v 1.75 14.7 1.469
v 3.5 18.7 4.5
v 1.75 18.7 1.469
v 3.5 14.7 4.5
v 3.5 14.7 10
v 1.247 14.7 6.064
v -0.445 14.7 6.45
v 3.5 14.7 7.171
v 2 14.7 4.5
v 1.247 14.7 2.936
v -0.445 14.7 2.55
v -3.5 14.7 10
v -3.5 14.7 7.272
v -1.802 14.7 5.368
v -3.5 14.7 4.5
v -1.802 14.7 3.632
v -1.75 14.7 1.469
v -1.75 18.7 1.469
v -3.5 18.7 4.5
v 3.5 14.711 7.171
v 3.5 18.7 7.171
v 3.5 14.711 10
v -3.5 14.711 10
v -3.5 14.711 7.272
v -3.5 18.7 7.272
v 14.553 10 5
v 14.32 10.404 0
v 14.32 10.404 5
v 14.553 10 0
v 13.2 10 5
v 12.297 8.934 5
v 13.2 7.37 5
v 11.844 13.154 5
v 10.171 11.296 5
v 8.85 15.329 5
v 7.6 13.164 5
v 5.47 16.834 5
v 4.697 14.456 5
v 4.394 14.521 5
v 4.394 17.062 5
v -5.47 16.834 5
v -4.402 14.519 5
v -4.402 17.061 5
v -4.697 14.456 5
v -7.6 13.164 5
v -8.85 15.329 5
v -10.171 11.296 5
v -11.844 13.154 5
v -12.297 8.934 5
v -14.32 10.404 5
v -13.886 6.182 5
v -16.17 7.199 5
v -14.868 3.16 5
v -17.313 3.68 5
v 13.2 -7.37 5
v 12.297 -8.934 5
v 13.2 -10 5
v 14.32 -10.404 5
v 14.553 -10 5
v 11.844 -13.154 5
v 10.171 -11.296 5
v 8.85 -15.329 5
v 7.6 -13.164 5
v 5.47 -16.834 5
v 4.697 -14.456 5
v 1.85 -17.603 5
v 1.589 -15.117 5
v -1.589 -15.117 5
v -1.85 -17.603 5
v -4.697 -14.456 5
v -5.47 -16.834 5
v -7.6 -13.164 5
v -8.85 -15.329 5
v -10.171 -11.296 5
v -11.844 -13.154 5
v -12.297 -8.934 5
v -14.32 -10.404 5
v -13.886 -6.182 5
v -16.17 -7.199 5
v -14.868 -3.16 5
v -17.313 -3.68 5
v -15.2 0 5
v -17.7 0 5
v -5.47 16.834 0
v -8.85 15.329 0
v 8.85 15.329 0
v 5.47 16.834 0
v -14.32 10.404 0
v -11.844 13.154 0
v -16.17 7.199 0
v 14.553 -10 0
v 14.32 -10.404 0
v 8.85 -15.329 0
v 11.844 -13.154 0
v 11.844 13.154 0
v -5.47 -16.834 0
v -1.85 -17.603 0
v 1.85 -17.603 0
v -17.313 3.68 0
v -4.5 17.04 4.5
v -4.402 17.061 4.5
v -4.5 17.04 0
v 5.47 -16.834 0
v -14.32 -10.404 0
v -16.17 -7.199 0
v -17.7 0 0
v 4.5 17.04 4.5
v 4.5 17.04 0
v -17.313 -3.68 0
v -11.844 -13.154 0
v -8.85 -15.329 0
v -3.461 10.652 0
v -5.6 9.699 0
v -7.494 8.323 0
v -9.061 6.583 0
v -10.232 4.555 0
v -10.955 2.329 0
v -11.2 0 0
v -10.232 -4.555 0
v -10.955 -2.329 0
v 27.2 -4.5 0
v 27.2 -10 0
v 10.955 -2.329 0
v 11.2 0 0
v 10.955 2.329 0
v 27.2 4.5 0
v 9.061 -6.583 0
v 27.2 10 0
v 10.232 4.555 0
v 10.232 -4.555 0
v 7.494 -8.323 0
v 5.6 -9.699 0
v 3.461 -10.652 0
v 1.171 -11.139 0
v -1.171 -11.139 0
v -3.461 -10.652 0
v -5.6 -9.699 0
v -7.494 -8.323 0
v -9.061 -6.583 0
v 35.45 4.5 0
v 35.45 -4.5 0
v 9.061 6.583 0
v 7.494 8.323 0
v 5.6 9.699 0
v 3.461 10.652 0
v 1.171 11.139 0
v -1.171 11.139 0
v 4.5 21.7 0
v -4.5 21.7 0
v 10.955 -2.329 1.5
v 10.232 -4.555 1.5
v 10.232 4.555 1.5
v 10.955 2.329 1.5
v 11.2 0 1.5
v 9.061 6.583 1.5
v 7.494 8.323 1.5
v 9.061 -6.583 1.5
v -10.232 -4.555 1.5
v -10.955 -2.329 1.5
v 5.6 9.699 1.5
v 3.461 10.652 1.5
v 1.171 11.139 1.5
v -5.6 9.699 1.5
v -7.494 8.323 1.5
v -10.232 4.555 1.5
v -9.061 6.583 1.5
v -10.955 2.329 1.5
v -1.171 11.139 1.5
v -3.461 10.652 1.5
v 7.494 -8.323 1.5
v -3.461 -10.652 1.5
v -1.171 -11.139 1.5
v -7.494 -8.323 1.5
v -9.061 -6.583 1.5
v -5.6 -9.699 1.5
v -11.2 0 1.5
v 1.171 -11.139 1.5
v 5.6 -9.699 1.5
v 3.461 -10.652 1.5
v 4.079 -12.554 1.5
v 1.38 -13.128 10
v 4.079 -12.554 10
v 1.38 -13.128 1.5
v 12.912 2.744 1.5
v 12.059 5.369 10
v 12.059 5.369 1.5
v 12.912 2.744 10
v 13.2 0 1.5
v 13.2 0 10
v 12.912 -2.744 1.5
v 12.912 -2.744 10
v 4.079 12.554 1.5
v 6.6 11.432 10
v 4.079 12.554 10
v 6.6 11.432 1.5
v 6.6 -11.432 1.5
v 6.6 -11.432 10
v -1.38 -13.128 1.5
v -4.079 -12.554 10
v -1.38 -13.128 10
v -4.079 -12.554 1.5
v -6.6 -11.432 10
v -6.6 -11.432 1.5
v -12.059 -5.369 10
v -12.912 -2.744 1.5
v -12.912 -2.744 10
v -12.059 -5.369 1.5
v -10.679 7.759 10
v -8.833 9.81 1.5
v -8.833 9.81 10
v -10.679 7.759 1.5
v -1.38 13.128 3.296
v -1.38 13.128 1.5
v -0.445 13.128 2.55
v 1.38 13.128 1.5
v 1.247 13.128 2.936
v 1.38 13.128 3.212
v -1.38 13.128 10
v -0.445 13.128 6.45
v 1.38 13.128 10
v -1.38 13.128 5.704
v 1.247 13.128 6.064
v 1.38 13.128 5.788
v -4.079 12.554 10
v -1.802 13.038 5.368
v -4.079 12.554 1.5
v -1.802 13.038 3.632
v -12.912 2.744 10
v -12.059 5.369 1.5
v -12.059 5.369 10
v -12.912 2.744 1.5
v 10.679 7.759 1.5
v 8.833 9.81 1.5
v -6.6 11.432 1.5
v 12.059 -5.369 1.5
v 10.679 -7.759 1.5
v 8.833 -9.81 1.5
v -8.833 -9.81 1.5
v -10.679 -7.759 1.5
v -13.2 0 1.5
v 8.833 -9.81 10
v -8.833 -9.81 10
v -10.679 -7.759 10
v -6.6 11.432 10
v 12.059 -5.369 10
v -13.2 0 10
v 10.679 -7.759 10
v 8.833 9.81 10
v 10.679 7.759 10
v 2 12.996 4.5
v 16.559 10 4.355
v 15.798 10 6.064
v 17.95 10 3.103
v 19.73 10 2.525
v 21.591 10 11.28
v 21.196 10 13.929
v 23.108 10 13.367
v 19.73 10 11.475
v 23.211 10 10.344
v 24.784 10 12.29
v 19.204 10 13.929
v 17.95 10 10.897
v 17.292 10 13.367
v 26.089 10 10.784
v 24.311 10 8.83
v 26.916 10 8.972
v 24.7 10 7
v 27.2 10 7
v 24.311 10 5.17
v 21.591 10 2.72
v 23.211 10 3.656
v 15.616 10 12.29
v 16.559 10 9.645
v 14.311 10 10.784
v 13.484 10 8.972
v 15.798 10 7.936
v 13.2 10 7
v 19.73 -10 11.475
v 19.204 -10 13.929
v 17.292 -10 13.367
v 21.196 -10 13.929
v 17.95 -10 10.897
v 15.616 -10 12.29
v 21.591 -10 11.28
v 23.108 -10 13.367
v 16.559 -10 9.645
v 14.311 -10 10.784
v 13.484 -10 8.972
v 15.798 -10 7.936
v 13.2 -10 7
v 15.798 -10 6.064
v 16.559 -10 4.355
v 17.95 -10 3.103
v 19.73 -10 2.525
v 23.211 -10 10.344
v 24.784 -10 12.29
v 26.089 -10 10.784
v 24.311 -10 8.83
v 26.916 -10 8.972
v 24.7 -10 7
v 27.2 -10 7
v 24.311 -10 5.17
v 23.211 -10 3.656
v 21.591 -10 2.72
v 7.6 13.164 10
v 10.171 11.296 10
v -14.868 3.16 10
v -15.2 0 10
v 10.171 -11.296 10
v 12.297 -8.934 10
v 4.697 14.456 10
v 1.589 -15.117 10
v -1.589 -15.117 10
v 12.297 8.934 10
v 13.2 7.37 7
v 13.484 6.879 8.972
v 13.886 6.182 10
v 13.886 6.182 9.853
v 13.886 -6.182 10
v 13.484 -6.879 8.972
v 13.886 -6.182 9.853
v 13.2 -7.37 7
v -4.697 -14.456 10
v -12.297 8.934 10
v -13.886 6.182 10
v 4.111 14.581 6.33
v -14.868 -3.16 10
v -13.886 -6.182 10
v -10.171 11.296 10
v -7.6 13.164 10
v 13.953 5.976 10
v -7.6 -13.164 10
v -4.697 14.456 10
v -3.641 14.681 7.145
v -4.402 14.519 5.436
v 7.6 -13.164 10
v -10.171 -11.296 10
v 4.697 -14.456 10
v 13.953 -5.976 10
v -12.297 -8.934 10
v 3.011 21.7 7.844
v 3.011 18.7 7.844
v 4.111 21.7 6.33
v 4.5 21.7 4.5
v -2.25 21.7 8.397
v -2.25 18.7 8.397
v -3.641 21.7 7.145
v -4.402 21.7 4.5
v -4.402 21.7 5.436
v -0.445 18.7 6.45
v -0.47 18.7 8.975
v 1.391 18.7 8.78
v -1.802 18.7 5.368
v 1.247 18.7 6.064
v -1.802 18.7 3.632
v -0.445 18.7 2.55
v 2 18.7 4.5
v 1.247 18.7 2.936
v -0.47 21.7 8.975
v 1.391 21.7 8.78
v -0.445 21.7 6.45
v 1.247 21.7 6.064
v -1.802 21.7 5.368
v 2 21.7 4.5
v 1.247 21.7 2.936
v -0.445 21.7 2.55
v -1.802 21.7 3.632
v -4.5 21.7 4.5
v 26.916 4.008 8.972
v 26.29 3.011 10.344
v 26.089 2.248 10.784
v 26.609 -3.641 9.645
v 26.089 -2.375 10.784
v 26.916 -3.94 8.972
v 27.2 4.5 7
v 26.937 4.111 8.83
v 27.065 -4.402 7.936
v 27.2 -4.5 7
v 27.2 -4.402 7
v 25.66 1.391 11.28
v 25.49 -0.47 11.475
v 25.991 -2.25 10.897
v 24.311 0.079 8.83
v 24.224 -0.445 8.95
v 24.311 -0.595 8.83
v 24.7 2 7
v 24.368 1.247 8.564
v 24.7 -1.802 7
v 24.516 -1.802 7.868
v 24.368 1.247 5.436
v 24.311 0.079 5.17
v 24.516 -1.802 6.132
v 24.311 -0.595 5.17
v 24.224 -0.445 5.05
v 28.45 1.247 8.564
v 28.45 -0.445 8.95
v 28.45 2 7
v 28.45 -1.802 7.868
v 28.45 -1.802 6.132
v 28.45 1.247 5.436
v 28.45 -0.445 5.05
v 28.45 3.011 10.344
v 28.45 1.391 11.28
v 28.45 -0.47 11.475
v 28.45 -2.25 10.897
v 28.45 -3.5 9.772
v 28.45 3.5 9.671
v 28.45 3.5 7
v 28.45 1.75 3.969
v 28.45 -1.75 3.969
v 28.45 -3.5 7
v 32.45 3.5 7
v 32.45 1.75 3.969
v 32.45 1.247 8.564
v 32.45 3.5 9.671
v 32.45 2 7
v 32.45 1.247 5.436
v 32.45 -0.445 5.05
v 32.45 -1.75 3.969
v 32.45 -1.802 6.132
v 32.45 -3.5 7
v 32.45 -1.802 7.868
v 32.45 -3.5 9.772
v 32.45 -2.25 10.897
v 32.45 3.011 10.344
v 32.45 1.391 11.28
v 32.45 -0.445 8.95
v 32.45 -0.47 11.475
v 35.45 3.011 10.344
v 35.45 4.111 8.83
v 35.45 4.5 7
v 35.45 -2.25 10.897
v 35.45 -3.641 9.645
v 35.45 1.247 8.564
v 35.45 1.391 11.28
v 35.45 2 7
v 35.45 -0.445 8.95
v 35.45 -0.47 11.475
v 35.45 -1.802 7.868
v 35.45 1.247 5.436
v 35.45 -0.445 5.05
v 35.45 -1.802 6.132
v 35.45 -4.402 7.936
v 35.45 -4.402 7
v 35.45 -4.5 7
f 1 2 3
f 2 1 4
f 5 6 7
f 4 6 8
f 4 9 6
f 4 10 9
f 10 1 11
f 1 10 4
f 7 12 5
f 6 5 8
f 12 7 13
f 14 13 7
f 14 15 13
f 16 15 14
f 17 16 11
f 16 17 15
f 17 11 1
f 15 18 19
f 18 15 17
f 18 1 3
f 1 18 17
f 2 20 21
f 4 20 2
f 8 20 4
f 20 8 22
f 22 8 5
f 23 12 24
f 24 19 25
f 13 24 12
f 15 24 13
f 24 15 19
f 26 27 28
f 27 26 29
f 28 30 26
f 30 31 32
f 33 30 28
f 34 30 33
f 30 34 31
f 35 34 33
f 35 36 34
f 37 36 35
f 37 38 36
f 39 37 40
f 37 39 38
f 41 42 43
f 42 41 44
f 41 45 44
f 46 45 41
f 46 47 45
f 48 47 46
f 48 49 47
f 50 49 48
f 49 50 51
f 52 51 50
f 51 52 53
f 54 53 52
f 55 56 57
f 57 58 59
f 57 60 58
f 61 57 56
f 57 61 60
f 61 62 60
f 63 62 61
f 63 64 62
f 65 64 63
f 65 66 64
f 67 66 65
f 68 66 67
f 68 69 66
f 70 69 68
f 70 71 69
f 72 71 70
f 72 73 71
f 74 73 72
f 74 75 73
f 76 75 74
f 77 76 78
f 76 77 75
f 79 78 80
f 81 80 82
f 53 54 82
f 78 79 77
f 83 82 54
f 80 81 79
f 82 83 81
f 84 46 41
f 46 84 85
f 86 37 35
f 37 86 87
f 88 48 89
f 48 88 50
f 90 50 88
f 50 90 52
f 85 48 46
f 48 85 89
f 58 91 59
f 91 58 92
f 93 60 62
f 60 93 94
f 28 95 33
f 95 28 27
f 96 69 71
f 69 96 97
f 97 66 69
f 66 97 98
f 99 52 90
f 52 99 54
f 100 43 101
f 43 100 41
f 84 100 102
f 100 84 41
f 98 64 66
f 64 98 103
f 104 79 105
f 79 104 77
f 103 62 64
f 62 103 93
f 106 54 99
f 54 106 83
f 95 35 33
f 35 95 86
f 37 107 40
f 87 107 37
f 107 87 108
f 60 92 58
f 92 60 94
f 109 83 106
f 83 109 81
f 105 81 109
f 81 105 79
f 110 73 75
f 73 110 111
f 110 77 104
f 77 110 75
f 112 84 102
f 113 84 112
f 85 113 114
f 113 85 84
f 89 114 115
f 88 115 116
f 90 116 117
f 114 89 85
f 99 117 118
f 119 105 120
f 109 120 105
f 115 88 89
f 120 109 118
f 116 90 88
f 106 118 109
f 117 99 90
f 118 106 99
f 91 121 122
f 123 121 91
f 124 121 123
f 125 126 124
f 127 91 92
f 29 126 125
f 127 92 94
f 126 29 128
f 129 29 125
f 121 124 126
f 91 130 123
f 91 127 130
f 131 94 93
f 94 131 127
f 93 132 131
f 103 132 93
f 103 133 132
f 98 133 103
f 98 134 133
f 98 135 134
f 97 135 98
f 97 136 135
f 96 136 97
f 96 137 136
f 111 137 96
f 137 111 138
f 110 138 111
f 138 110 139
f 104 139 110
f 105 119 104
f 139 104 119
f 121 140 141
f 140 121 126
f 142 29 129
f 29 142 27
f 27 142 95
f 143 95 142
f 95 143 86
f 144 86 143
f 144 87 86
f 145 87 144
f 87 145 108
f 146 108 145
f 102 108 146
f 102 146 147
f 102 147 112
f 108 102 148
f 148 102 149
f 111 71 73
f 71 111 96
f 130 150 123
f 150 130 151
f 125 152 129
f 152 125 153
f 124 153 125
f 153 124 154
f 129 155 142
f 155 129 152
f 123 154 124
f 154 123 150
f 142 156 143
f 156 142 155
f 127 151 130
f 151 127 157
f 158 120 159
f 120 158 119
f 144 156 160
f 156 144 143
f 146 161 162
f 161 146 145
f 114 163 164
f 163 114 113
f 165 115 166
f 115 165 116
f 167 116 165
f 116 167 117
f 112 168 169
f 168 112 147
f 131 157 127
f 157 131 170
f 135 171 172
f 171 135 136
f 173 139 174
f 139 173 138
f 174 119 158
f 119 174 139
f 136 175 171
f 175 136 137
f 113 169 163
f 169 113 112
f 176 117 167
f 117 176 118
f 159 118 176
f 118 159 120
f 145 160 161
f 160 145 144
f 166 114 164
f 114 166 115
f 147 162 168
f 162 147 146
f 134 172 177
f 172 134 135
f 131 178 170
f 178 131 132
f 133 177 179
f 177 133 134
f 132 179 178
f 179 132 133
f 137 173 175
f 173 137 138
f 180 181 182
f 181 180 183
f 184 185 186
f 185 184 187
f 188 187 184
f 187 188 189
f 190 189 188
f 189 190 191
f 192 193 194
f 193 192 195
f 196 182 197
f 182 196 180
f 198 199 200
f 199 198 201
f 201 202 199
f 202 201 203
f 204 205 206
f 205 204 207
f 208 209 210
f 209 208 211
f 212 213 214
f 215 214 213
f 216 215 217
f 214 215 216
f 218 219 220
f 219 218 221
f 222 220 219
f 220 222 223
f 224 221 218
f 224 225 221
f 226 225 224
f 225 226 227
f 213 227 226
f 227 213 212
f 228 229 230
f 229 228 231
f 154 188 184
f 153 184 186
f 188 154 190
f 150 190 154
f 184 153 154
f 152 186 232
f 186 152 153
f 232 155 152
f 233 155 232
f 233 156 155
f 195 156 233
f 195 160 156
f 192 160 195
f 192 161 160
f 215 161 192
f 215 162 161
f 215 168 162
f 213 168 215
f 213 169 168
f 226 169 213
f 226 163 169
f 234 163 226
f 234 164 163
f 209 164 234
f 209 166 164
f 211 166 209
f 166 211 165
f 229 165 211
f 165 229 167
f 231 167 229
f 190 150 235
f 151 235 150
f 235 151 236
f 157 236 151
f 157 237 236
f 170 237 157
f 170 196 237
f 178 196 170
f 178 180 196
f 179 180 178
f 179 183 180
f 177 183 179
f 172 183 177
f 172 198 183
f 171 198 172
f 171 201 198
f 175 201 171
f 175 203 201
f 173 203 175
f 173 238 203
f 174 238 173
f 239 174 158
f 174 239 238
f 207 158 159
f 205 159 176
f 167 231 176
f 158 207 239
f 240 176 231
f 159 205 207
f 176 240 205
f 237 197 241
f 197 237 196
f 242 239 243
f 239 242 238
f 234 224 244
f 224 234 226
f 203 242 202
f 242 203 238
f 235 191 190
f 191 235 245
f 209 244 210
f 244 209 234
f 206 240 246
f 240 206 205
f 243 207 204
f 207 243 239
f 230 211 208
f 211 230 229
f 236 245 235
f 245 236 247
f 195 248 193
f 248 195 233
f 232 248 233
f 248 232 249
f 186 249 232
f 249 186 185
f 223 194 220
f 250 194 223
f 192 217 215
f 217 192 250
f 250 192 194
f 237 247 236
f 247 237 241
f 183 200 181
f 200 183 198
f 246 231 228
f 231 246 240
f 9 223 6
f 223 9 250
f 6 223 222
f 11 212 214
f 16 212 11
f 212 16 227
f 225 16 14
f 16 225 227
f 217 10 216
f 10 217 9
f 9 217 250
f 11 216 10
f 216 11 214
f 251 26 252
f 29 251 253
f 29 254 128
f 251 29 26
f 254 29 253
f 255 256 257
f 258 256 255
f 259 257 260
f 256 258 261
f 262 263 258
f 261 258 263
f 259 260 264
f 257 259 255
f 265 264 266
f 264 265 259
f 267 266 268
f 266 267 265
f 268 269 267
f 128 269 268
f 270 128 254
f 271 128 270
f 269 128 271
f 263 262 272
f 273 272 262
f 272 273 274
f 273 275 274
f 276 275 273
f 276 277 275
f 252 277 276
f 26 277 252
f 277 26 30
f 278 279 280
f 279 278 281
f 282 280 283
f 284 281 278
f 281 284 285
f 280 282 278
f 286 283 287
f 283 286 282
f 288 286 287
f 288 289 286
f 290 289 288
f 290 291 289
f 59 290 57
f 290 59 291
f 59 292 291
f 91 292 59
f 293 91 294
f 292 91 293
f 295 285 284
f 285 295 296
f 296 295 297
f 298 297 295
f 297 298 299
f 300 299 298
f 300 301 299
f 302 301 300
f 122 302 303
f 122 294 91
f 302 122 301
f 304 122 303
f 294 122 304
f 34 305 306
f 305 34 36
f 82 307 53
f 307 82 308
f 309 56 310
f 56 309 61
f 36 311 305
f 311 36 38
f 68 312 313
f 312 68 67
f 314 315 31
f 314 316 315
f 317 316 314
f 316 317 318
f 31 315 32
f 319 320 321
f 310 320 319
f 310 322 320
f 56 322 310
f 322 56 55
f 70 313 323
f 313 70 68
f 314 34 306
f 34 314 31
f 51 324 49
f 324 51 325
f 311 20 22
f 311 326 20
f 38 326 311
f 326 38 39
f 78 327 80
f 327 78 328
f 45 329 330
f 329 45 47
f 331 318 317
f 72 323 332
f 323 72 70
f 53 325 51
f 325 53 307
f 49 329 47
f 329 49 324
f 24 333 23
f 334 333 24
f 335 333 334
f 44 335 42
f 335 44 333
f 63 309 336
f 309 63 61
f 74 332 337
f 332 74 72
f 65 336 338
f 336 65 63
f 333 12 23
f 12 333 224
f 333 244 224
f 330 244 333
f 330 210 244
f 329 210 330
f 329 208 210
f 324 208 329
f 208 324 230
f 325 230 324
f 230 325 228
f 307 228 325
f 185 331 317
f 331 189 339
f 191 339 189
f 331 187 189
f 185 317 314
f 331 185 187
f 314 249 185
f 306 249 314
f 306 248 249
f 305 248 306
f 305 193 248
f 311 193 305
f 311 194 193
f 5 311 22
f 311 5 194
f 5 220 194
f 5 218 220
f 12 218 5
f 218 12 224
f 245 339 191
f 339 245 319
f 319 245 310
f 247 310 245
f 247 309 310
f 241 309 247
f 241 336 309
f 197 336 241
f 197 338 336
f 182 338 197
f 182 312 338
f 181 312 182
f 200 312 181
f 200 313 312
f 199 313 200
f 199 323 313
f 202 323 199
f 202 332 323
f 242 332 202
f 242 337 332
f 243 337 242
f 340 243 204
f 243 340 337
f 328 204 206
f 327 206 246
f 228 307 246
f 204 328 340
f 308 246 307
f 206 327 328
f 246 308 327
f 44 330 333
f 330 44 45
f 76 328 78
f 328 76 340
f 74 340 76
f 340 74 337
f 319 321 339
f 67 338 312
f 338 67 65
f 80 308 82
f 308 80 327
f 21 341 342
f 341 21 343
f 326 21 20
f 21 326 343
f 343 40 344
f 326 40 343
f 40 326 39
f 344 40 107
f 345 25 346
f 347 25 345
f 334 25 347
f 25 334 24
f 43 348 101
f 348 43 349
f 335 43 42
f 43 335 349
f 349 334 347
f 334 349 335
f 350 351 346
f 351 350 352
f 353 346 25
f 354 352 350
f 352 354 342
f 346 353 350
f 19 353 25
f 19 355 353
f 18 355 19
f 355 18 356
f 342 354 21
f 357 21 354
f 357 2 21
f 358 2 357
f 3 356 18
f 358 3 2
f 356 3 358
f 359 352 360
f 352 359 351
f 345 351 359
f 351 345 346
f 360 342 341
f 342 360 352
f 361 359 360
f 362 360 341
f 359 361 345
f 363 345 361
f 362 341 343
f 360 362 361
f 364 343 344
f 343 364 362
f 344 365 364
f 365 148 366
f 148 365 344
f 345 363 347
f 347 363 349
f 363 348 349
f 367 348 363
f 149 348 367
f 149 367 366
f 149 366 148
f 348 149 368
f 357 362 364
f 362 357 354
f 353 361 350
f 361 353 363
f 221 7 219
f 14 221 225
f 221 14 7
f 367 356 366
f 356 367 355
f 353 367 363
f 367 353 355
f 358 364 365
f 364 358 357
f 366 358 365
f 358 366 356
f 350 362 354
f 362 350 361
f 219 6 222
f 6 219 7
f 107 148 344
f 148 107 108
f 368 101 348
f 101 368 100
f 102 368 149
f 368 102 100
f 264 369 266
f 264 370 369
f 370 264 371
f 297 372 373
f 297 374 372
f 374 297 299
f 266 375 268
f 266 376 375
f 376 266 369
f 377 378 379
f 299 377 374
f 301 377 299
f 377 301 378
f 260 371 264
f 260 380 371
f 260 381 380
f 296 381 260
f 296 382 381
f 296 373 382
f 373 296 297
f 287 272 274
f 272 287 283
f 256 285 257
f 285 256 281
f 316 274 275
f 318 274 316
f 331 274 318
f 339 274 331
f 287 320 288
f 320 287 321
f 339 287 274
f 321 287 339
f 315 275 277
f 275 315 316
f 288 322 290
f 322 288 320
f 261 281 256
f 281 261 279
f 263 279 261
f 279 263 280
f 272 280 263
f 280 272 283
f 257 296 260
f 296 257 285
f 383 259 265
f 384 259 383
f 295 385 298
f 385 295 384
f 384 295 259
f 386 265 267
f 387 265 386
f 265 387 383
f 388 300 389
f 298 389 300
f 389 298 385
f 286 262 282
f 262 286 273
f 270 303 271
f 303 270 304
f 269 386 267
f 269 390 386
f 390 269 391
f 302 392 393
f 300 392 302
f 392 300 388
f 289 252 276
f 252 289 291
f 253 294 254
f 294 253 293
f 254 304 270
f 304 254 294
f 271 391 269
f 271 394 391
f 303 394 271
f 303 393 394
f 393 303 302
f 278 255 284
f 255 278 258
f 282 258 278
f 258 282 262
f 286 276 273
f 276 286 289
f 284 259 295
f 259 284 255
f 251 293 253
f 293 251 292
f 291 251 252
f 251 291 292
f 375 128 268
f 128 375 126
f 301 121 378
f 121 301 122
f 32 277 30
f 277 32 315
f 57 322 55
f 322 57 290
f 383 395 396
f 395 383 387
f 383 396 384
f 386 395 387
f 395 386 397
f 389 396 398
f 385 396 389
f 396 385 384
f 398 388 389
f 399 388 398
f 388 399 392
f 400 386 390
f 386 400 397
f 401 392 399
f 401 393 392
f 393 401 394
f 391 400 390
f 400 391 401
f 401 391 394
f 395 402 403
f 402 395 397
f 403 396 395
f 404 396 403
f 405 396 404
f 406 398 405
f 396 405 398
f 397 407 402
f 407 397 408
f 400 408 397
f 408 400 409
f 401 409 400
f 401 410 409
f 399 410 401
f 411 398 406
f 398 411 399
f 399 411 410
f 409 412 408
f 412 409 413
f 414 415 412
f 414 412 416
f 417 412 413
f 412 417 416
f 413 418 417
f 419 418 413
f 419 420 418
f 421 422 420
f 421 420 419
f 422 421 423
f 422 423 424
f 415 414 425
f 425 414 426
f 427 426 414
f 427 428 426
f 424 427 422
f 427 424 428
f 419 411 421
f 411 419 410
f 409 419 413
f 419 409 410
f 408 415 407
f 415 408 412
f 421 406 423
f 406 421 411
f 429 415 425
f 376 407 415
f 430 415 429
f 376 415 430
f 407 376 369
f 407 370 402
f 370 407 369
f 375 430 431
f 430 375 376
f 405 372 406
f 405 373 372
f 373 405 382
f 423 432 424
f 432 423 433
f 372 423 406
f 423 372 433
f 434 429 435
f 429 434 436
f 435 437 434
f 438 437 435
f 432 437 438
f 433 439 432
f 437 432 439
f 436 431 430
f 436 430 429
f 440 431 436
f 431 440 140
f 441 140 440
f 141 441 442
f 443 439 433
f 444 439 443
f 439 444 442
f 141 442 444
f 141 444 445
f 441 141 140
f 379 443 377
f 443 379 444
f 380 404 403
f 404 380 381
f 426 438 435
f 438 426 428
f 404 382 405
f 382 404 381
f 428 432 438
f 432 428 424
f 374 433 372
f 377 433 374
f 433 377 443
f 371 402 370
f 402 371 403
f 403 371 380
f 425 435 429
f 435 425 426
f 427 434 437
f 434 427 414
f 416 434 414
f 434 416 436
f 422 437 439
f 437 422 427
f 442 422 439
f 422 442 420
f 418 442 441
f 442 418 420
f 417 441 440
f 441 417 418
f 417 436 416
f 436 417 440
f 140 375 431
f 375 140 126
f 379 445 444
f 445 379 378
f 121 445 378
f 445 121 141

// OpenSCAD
//Customizable Open-source lens holder
// This is a cleaned up version of http://www.thingiverse.com/thing:26752

//CUSTOMIZER VARIABLES
//Defines the Diameter of the Lens 
Lens_Diameter=25.4; //Numeric value 

//Defines the Lens holder Thickness
Lens_Holder_Thickness=10;   //Numeric value 

//Defines the Lens Holder Lip Size
Lens_Holder_Lip_Size=3;     //Numeric value smaller than y

//Defines the Base Diameter
Base_Diameter=25; //Numeric value 

//Defines the Base Height
Base_Height=25;  //Numeric value 

//Defines the Guide Rod Length
Guide_Rod_Length=20; //Numeric value 

//Defines the Guide Rod Diameter
Guide_Rod_Diameter=8; //[2:12]

//Defines the Set Screw Diameter
Set_Screw_Diameter=3; //[2:10]

//Defines the Set Screw Nut Diameter
Set_Screw_Nut_Diameter=6; //[4:20]

//Defines the Set Screw Nut Thickness
Set_Screw_Nut_Thickness=3; //[2:10]





//CUSTOMIZER VARIABLES END


// ignore variable values
//Defines the Diameter of the Lens 
x=Lens_Diameter; //Numeric value 

//Defines the Lens holder Thickness
y=Lens_Holder_Thickness;   //Numeric value 

//Defines the Lens Holder Lip Size
z=Lens_Holder_Lip_Size;     //Numeric value smaller than y

//Defines the Base Diameter
X=Base_Diameter; //Numeric value 

//Defines the Base Height
Y=Base_Height;  //Numeric value 

//Defines the Guide Rod Length
e=Guide_Rod_Length; //Numeric value 

//Defines the Guide Rod Diameter
d=Guide_Rod_Diameter; //[2:12]

//Defines the Set Screw Diameter
a=Set_Screw_Diameter; //[2:10]

//Defines the Set Screw Nut Diameter
b=Set_Screw_Nut_Diameter; //[4:20]

//Defines the Set Screw Nut Thickness
c=Set_Screw_Nut_Thickness; //[2:10]


lens_holder();

module lens_holder(){
difference(){
cylinder(y/2,(x+10)/2,(x+10)/2);
cylinder((y+2)/2,(x-3)/2,(x-3)/2);
translate([0,0,1.5])cylinder((y+2)/2,(x+1)/2,(x+1)/2);
translate([0,(x+10)/2+5,(b+3)/2])rotate([90,0,0])cylinder(10,(a+1)/2,(a+1)/2);
translate([0,(x+8)/2,(b+3)/2])nuttrap();
translate([(x+15)/2,e/2,(d+6)/2])rotate([90,0,0])cylinder(e,(d+6)/2, (d+6)/2);
}
difference(){
translate([0,0,y/2])cylinder((y)/2,(x+5)/2,(x+5)/2);
cylinder((y)*2,(x+1)/2,(x+1)/2);
translate([0,(x+10)/2+5,(b+3)/2])rotate([90,0,0])cylinder(25,(b+3)/2,(b+3)/2);
translate([0,(x+8)/2,(b+3)/2])nuttrap();
}
difference(){
translate([0,(x+8)/2,0])set_screw((b+3)/2);
cylinder((y+2),(x+1)/2,(x+1)/2);
}
difference(){
translate([(x+15)/2,0,0])guide_rod();
rotate([0,0,90]){
#translate([0,((x+7)/-2)-((d)),(d+6)/2])rotate([90,0,0])cylinder(50,(a+1)/2,(a+1)/2);
translate([((x+7.5)/2)+((d+6)),0,0])rotate([0,0,90])set_screw1((d+6)/2);
}
}
translate([((x+7.5)/2)+((d+6)),0,0])rotate([0,0,90])set_screw((d+6)/2);
}

module guide_rod(){
difference(){
translate([0,e/2,(d+6)/2])rotate([90,0,0])cylinder(e,(d+6)/2, (d+6)/2);
translate([0,(e/2)+1,(d+6)/2])rotate([90,0,0])cylinder(e+2,(d+1)/2, (d+1)/2);
}
difference(){
translate([0,0,(d+6)/4])cube([(d+6),e,(d+6)/2], center = true);
translate([0,(e/2)+1,(d+6)/2])rotate([90,0,0])cylinder(e+2,(d+1)/2, (d+1)/2);
}
}

module set_screw(h){
difference(){
translate([0,5,h])rotate([90,0,0])cylinder(10,(b+3)/2, (b+3)/2);
#translate([0,10,h])rotate([90,0,0])cylinder(200,(a+1)/2, (a+1)/2);
translate([0,0,h])nuttrap();
}
difference(){
translate([0,0,h/2])cube([(b+3),10,h], center = true);
translate([0,6,h])rotate([90,0,0])cylinder(12,(a+1)/2, (a+1)/2);
translate([0,0,h])nuttrap();
}
}
module set_screw1(h){
translate([0,5,h])rotate([90,0,0])cylinder(10,(b+3)/2, (b+3)/2);
translate([0,0,h/2])cube([(b+3),10,h], center = true);

}

module nuttrap(){
translate([0,(c+1)/2,0])rotate([90,0,0])hexagon(c+1,(b+1)/2);
translate([0,0,(b*3)/2])cube([b+1,c+1,b*3],center = true);
}

module reg_polygon(sides,radius)
{
  function dia(r) = sqrt(pow(r*2,2)/2);  //sqrt((r*2^2)/2) if only we had an exponention op
  if(sides<2) square([radius,0]);
  if(sides==3) triangle(radius);
  if(sides==4) square([dia(radius),dia(radius)],center=true);
  if(sides>4) circle(r=radius,$fn=sides);
}

module hexagonf(radius)
{
  reg_polygon(6,radius);
}

module hexagon(height,radius) 
{
  linear_extrude(height=height) hexagonf(radius);
}
